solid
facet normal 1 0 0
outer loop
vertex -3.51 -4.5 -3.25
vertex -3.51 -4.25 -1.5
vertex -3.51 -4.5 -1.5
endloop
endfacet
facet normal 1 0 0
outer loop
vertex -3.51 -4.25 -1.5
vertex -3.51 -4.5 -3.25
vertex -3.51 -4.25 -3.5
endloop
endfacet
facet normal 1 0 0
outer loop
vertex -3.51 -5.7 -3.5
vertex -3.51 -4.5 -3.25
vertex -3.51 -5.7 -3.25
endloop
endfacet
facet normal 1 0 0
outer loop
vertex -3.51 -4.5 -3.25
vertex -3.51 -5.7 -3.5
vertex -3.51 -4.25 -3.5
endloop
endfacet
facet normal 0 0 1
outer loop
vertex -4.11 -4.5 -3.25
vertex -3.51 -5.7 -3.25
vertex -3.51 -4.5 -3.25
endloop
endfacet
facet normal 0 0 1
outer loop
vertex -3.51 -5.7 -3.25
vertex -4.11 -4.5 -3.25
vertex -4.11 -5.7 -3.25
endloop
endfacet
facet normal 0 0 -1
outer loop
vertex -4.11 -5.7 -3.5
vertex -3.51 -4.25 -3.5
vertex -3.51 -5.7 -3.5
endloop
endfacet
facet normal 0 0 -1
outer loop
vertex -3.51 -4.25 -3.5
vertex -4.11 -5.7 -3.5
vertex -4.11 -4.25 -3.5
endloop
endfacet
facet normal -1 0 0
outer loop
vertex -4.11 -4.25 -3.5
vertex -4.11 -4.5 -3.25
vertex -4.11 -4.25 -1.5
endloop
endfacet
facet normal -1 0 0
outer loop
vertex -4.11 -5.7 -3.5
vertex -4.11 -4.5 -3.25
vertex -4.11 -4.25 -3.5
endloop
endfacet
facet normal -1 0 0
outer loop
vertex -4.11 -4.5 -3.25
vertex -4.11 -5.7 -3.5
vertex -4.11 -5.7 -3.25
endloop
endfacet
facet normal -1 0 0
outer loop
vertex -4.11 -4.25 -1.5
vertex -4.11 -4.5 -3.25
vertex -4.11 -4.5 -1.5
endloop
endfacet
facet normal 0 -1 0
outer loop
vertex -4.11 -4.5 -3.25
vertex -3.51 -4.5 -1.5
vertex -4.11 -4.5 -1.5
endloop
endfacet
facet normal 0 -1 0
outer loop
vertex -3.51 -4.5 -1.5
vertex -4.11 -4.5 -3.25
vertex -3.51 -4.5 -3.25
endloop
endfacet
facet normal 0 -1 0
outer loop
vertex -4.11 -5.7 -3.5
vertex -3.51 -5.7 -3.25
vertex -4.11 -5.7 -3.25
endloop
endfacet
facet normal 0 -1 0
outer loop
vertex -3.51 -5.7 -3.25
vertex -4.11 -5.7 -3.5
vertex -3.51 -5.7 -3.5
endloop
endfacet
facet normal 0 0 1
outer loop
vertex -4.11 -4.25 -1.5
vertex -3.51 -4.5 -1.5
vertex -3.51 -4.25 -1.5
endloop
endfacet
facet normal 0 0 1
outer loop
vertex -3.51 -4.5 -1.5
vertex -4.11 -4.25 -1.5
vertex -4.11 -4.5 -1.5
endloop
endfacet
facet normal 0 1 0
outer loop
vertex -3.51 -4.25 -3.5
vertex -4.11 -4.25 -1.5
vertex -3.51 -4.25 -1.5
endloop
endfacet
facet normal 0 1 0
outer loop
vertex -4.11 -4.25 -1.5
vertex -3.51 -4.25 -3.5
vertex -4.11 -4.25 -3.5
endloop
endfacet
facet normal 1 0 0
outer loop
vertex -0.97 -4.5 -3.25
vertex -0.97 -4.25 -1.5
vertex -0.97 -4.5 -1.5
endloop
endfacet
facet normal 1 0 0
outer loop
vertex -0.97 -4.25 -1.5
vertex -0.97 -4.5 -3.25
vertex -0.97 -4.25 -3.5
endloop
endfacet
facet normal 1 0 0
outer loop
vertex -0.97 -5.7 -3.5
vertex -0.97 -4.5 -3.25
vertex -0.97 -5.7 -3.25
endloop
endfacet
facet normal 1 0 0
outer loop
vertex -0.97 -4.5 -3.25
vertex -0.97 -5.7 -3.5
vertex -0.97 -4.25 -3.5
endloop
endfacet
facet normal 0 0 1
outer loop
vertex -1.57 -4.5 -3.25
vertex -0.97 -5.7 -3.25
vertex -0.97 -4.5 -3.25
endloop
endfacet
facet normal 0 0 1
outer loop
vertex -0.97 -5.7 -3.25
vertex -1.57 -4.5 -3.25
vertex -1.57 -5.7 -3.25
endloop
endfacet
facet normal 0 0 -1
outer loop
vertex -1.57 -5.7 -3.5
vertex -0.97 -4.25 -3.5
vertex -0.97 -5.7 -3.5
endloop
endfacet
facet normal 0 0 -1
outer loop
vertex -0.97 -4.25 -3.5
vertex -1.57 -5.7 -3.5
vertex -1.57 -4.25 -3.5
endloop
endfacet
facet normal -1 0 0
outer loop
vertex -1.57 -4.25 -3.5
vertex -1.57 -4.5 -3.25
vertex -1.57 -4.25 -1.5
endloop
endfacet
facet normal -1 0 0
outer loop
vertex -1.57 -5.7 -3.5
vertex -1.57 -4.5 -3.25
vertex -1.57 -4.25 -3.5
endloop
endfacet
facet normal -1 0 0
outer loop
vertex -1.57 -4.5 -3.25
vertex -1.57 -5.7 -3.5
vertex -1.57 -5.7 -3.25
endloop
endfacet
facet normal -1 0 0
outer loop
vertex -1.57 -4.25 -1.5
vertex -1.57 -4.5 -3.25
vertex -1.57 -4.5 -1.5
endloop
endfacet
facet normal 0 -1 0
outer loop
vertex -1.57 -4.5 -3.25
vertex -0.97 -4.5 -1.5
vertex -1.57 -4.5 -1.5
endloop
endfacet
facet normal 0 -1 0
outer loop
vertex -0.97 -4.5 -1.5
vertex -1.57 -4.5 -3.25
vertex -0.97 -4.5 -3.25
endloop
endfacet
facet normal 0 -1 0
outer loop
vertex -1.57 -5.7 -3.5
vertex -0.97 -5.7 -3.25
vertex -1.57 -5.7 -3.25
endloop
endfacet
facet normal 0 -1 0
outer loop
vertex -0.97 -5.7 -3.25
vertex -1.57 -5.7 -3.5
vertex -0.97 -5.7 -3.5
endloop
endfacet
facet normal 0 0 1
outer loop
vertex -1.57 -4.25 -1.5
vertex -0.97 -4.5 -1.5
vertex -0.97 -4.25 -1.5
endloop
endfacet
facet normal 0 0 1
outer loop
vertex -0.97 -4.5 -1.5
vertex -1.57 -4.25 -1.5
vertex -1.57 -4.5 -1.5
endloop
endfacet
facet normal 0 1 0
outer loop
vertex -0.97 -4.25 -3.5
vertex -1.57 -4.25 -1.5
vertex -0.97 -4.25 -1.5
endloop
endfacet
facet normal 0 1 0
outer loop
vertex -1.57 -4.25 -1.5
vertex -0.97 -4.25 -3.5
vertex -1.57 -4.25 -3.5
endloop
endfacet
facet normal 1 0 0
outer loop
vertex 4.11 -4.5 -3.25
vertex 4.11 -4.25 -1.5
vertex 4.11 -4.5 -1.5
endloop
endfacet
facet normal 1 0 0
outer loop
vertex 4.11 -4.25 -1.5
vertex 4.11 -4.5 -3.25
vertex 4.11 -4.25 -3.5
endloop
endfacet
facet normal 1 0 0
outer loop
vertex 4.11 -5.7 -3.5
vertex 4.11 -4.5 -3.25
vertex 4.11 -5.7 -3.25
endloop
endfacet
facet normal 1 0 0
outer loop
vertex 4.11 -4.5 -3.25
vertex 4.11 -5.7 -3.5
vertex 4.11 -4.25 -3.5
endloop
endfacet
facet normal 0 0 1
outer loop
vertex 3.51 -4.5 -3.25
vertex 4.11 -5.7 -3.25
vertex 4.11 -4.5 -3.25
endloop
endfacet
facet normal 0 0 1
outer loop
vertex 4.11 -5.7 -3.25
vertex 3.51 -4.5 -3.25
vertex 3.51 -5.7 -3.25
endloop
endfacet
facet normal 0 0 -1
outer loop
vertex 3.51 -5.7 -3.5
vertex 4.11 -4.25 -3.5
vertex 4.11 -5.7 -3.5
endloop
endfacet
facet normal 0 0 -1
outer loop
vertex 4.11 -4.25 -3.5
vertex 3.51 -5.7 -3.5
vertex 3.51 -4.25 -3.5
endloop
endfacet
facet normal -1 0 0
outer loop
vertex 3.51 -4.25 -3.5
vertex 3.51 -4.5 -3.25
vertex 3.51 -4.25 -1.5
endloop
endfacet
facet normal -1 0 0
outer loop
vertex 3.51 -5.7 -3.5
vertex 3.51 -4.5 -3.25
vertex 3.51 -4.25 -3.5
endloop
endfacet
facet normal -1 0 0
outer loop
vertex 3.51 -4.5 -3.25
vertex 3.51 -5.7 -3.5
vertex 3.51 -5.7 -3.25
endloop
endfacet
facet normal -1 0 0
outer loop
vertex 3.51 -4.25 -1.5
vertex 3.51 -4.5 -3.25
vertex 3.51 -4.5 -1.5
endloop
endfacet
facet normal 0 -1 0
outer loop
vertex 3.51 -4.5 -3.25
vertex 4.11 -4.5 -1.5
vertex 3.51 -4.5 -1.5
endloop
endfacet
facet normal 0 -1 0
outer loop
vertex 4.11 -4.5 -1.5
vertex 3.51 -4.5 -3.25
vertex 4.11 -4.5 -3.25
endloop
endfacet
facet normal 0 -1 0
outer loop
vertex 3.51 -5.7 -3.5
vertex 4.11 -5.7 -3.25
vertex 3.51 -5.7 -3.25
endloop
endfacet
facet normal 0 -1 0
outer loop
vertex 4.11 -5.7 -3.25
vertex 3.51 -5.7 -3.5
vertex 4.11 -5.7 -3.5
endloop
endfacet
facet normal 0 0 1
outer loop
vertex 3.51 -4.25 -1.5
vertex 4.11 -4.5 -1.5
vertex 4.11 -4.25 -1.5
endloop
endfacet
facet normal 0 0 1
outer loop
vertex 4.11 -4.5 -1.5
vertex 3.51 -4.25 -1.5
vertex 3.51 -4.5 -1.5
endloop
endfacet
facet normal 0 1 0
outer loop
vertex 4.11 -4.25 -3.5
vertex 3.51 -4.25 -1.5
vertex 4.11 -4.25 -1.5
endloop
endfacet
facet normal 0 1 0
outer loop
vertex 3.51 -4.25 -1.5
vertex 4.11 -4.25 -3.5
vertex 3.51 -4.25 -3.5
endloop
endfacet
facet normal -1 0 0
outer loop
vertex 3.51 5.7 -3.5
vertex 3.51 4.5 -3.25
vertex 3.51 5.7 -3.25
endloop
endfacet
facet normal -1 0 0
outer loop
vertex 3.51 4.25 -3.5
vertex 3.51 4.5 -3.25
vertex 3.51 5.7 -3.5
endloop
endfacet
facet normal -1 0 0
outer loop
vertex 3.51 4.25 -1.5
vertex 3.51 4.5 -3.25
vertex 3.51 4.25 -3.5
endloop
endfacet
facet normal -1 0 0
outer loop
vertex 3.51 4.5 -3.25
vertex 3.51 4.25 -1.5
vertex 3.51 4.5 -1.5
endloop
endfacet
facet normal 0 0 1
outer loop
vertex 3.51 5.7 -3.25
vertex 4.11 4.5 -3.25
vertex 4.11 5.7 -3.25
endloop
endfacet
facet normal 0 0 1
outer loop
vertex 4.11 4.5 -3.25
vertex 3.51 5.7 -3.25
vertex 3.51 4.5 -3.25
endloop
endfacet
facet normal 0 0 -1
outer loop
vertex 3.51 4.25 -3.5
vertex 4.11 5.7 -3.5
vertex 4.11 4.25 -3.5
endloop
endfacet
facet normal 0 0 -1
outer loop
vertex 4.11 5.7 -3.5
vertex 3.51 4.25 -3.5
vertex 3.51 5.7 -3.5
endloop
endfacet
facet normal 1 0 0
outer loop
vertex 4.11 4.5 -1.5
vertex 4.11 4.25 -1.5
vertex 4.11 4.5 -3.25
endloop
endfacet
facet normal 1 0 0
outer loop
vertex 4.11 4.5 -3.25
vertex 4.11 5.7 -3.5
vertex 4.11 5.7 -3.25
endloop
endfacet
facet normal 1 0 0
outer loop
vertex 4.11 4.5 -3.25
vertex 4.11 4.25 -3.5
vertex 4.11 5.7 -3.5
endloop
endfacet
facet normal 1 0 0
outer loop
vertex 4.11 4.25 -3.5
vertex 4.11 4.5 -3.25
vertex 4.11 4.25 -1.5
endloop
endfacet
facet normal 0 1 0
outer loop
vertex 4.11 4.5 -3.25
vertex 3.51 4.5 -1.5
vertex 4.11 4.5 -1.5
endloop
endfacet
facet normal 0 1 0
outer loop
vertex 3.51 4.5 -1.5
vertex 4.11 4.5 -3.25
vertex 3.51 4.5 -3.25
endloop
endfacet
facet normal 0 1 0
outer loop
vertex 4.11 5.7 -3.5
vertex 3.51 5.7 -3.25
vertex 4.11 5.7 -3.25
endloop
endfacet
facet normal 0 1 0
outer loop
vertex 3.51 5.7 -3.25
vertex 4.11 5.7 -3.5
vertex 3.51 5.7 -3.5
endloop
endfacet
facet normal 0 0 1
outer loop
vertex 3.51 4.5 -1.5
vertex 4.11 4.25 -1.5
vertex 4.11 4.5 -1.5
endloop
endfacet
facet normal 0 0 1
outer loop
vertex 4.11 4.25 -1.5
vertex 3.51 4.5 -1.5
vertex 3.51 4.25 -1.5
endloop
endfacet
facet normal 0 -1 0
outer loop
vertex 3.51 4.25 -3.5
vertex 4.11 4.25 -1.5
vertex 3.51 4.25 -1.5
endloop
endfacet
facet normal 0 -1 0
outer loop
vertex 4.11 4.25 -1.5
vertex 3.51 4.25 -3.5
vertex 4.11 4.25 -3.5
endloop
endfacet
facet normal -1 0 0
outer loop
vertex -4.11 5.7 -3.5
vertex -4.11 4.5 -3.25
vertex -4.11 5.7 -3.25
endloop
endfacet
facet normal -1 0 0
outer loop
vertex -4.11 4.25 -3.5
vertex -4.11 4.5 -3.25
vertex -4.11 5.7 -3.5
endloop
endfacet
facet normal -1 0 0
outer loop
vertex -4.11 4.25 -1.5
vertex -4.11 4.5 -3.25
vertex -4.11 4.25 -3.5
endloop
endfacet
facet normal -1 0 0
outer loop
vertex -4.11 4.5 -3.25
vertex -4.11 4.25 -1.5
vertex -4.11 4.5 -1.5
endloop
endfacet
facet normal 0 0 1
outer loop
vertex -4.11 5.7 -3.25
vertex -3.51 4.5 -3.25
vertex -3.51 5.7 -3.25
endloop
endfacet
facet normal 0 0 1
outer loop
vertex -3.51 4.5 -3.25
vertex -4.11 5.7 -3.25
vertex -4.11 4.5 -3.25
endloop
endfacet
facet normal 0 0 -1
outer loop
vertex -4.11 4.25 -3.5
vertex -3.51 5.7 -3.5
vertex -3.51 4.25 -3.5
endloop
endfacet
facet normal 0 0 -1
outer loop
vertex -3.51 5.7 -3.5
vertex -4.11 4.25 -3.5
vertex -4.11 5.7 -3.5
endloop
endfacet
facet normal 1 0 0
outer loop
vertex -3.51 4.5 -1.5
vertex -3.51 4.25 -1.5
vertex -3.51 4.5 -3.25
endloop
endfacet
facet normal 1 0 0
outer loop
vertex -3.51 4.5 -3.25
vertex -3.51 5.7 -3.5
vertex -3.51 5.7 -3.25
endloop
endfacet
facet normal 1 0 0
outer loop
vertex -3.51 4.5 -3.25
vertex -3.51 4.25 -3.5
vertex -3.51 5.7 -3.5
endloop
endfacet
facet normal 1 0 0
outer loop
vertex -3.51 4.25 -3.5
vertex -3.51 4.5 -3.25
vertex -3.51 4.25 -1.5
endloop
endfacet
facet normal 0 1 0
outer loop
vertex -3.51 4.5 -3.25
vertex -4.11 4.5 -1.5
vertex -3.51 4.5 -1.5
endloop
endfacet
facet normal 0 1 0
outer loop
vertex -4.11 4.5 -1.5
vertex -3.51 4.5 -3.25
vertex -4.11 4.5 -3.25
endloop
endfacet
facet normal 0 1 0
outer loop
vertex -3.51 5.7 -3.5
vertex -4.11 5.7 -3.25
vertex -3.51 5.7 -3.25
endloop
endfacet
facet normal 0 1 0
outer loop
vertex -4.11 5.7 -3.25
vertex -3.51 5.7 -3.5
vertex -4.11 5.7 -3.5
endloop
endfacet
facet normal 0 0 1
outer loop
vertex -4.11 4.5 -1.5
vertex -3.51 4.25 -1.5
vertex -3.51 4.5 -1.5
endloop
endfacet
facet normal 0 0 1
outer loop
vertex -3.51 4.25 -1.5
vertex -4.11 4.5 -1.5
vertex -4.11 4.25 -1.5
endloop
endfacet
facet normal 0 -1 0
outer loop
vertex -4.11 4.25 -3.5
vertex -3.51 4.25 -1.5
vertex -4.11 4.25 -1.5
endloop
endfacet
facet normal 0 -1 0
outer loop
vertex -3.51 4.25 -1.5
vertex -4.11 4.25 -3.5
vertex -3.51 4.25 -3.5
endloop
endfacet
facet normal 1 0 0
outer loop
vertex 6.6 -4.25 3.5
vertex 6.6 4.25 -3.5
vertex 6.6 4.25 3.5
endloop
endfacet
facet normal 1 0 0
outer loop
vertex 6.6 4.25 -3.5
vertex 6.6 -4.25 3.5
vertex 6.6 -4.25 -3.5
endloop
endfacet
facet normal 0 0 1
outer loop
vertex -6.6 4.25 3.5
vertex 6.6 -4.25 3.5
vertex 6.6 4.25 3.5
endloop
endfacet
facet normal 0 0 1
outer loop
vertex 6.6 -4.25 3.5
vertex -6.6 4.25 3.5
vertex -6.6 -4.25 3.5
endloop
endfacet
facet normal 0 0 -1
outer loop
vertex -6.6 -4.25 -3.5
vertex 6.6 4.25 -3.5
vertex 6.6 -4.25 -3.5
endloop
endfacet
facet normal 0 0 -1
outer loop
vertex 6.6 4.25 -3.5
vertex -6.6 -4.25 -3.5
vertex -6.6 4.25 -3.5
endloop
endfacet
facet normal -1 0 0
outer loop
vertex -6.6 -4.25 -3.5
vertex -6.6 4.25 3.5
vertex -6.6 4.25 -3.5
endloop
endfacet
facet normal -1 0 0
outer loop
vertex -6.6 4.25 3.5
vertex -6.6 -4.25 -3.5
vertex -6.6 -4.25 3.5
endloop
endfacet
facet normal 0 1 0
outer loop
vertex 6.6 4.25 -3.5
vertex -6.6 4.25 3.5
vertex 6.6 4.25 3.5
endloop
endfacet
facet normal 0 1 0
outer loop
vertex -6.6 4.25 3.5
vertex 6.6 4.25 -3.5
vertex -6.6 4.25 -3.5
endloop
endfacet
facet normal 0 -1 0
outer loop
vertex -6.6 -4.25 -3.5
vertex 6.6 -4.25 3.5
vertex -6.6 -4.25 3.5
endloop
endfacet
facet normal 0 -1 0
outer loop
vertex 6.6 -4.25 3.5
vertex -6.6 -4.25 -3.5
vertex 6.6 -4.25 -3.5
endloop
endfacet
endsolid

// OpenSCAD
$fn=10;

module leg() {
    cube([0.6, 1.2, 0.25]);
    translate([0, 1.2, 0]) cube([0.6, 0.25, 2]);
}

color("#404040") cube([13.20, 8.5, 7], center=true);
color("lightgray") {
    translate([-2.54-1.27-0.3, -8.5/2-1.45, -3.5]) rotate([0, 0, 0]) leg();
    translate([-1.27-0.3, -8.5/2-1.45, -3.5]) rotate([0, 0, 0]) leg();
    translate([+2.54+1.27-0.3, -8.5/2-1.45, -3.5]) rotate([0, 0, 0]) leg();
    translate([+2.54+1.27+0.3, +8.5/2+1.45, -3.5]) rotate([0, 0, 180]) leg();
    translate([-2.54-1.27+0.3, +8.5/2+1.45, -3.5]) rotate([0, 0, 180]) leg();
}
//translate([0, 0, 0]) cube([5, 11.4, 1], center=true);
